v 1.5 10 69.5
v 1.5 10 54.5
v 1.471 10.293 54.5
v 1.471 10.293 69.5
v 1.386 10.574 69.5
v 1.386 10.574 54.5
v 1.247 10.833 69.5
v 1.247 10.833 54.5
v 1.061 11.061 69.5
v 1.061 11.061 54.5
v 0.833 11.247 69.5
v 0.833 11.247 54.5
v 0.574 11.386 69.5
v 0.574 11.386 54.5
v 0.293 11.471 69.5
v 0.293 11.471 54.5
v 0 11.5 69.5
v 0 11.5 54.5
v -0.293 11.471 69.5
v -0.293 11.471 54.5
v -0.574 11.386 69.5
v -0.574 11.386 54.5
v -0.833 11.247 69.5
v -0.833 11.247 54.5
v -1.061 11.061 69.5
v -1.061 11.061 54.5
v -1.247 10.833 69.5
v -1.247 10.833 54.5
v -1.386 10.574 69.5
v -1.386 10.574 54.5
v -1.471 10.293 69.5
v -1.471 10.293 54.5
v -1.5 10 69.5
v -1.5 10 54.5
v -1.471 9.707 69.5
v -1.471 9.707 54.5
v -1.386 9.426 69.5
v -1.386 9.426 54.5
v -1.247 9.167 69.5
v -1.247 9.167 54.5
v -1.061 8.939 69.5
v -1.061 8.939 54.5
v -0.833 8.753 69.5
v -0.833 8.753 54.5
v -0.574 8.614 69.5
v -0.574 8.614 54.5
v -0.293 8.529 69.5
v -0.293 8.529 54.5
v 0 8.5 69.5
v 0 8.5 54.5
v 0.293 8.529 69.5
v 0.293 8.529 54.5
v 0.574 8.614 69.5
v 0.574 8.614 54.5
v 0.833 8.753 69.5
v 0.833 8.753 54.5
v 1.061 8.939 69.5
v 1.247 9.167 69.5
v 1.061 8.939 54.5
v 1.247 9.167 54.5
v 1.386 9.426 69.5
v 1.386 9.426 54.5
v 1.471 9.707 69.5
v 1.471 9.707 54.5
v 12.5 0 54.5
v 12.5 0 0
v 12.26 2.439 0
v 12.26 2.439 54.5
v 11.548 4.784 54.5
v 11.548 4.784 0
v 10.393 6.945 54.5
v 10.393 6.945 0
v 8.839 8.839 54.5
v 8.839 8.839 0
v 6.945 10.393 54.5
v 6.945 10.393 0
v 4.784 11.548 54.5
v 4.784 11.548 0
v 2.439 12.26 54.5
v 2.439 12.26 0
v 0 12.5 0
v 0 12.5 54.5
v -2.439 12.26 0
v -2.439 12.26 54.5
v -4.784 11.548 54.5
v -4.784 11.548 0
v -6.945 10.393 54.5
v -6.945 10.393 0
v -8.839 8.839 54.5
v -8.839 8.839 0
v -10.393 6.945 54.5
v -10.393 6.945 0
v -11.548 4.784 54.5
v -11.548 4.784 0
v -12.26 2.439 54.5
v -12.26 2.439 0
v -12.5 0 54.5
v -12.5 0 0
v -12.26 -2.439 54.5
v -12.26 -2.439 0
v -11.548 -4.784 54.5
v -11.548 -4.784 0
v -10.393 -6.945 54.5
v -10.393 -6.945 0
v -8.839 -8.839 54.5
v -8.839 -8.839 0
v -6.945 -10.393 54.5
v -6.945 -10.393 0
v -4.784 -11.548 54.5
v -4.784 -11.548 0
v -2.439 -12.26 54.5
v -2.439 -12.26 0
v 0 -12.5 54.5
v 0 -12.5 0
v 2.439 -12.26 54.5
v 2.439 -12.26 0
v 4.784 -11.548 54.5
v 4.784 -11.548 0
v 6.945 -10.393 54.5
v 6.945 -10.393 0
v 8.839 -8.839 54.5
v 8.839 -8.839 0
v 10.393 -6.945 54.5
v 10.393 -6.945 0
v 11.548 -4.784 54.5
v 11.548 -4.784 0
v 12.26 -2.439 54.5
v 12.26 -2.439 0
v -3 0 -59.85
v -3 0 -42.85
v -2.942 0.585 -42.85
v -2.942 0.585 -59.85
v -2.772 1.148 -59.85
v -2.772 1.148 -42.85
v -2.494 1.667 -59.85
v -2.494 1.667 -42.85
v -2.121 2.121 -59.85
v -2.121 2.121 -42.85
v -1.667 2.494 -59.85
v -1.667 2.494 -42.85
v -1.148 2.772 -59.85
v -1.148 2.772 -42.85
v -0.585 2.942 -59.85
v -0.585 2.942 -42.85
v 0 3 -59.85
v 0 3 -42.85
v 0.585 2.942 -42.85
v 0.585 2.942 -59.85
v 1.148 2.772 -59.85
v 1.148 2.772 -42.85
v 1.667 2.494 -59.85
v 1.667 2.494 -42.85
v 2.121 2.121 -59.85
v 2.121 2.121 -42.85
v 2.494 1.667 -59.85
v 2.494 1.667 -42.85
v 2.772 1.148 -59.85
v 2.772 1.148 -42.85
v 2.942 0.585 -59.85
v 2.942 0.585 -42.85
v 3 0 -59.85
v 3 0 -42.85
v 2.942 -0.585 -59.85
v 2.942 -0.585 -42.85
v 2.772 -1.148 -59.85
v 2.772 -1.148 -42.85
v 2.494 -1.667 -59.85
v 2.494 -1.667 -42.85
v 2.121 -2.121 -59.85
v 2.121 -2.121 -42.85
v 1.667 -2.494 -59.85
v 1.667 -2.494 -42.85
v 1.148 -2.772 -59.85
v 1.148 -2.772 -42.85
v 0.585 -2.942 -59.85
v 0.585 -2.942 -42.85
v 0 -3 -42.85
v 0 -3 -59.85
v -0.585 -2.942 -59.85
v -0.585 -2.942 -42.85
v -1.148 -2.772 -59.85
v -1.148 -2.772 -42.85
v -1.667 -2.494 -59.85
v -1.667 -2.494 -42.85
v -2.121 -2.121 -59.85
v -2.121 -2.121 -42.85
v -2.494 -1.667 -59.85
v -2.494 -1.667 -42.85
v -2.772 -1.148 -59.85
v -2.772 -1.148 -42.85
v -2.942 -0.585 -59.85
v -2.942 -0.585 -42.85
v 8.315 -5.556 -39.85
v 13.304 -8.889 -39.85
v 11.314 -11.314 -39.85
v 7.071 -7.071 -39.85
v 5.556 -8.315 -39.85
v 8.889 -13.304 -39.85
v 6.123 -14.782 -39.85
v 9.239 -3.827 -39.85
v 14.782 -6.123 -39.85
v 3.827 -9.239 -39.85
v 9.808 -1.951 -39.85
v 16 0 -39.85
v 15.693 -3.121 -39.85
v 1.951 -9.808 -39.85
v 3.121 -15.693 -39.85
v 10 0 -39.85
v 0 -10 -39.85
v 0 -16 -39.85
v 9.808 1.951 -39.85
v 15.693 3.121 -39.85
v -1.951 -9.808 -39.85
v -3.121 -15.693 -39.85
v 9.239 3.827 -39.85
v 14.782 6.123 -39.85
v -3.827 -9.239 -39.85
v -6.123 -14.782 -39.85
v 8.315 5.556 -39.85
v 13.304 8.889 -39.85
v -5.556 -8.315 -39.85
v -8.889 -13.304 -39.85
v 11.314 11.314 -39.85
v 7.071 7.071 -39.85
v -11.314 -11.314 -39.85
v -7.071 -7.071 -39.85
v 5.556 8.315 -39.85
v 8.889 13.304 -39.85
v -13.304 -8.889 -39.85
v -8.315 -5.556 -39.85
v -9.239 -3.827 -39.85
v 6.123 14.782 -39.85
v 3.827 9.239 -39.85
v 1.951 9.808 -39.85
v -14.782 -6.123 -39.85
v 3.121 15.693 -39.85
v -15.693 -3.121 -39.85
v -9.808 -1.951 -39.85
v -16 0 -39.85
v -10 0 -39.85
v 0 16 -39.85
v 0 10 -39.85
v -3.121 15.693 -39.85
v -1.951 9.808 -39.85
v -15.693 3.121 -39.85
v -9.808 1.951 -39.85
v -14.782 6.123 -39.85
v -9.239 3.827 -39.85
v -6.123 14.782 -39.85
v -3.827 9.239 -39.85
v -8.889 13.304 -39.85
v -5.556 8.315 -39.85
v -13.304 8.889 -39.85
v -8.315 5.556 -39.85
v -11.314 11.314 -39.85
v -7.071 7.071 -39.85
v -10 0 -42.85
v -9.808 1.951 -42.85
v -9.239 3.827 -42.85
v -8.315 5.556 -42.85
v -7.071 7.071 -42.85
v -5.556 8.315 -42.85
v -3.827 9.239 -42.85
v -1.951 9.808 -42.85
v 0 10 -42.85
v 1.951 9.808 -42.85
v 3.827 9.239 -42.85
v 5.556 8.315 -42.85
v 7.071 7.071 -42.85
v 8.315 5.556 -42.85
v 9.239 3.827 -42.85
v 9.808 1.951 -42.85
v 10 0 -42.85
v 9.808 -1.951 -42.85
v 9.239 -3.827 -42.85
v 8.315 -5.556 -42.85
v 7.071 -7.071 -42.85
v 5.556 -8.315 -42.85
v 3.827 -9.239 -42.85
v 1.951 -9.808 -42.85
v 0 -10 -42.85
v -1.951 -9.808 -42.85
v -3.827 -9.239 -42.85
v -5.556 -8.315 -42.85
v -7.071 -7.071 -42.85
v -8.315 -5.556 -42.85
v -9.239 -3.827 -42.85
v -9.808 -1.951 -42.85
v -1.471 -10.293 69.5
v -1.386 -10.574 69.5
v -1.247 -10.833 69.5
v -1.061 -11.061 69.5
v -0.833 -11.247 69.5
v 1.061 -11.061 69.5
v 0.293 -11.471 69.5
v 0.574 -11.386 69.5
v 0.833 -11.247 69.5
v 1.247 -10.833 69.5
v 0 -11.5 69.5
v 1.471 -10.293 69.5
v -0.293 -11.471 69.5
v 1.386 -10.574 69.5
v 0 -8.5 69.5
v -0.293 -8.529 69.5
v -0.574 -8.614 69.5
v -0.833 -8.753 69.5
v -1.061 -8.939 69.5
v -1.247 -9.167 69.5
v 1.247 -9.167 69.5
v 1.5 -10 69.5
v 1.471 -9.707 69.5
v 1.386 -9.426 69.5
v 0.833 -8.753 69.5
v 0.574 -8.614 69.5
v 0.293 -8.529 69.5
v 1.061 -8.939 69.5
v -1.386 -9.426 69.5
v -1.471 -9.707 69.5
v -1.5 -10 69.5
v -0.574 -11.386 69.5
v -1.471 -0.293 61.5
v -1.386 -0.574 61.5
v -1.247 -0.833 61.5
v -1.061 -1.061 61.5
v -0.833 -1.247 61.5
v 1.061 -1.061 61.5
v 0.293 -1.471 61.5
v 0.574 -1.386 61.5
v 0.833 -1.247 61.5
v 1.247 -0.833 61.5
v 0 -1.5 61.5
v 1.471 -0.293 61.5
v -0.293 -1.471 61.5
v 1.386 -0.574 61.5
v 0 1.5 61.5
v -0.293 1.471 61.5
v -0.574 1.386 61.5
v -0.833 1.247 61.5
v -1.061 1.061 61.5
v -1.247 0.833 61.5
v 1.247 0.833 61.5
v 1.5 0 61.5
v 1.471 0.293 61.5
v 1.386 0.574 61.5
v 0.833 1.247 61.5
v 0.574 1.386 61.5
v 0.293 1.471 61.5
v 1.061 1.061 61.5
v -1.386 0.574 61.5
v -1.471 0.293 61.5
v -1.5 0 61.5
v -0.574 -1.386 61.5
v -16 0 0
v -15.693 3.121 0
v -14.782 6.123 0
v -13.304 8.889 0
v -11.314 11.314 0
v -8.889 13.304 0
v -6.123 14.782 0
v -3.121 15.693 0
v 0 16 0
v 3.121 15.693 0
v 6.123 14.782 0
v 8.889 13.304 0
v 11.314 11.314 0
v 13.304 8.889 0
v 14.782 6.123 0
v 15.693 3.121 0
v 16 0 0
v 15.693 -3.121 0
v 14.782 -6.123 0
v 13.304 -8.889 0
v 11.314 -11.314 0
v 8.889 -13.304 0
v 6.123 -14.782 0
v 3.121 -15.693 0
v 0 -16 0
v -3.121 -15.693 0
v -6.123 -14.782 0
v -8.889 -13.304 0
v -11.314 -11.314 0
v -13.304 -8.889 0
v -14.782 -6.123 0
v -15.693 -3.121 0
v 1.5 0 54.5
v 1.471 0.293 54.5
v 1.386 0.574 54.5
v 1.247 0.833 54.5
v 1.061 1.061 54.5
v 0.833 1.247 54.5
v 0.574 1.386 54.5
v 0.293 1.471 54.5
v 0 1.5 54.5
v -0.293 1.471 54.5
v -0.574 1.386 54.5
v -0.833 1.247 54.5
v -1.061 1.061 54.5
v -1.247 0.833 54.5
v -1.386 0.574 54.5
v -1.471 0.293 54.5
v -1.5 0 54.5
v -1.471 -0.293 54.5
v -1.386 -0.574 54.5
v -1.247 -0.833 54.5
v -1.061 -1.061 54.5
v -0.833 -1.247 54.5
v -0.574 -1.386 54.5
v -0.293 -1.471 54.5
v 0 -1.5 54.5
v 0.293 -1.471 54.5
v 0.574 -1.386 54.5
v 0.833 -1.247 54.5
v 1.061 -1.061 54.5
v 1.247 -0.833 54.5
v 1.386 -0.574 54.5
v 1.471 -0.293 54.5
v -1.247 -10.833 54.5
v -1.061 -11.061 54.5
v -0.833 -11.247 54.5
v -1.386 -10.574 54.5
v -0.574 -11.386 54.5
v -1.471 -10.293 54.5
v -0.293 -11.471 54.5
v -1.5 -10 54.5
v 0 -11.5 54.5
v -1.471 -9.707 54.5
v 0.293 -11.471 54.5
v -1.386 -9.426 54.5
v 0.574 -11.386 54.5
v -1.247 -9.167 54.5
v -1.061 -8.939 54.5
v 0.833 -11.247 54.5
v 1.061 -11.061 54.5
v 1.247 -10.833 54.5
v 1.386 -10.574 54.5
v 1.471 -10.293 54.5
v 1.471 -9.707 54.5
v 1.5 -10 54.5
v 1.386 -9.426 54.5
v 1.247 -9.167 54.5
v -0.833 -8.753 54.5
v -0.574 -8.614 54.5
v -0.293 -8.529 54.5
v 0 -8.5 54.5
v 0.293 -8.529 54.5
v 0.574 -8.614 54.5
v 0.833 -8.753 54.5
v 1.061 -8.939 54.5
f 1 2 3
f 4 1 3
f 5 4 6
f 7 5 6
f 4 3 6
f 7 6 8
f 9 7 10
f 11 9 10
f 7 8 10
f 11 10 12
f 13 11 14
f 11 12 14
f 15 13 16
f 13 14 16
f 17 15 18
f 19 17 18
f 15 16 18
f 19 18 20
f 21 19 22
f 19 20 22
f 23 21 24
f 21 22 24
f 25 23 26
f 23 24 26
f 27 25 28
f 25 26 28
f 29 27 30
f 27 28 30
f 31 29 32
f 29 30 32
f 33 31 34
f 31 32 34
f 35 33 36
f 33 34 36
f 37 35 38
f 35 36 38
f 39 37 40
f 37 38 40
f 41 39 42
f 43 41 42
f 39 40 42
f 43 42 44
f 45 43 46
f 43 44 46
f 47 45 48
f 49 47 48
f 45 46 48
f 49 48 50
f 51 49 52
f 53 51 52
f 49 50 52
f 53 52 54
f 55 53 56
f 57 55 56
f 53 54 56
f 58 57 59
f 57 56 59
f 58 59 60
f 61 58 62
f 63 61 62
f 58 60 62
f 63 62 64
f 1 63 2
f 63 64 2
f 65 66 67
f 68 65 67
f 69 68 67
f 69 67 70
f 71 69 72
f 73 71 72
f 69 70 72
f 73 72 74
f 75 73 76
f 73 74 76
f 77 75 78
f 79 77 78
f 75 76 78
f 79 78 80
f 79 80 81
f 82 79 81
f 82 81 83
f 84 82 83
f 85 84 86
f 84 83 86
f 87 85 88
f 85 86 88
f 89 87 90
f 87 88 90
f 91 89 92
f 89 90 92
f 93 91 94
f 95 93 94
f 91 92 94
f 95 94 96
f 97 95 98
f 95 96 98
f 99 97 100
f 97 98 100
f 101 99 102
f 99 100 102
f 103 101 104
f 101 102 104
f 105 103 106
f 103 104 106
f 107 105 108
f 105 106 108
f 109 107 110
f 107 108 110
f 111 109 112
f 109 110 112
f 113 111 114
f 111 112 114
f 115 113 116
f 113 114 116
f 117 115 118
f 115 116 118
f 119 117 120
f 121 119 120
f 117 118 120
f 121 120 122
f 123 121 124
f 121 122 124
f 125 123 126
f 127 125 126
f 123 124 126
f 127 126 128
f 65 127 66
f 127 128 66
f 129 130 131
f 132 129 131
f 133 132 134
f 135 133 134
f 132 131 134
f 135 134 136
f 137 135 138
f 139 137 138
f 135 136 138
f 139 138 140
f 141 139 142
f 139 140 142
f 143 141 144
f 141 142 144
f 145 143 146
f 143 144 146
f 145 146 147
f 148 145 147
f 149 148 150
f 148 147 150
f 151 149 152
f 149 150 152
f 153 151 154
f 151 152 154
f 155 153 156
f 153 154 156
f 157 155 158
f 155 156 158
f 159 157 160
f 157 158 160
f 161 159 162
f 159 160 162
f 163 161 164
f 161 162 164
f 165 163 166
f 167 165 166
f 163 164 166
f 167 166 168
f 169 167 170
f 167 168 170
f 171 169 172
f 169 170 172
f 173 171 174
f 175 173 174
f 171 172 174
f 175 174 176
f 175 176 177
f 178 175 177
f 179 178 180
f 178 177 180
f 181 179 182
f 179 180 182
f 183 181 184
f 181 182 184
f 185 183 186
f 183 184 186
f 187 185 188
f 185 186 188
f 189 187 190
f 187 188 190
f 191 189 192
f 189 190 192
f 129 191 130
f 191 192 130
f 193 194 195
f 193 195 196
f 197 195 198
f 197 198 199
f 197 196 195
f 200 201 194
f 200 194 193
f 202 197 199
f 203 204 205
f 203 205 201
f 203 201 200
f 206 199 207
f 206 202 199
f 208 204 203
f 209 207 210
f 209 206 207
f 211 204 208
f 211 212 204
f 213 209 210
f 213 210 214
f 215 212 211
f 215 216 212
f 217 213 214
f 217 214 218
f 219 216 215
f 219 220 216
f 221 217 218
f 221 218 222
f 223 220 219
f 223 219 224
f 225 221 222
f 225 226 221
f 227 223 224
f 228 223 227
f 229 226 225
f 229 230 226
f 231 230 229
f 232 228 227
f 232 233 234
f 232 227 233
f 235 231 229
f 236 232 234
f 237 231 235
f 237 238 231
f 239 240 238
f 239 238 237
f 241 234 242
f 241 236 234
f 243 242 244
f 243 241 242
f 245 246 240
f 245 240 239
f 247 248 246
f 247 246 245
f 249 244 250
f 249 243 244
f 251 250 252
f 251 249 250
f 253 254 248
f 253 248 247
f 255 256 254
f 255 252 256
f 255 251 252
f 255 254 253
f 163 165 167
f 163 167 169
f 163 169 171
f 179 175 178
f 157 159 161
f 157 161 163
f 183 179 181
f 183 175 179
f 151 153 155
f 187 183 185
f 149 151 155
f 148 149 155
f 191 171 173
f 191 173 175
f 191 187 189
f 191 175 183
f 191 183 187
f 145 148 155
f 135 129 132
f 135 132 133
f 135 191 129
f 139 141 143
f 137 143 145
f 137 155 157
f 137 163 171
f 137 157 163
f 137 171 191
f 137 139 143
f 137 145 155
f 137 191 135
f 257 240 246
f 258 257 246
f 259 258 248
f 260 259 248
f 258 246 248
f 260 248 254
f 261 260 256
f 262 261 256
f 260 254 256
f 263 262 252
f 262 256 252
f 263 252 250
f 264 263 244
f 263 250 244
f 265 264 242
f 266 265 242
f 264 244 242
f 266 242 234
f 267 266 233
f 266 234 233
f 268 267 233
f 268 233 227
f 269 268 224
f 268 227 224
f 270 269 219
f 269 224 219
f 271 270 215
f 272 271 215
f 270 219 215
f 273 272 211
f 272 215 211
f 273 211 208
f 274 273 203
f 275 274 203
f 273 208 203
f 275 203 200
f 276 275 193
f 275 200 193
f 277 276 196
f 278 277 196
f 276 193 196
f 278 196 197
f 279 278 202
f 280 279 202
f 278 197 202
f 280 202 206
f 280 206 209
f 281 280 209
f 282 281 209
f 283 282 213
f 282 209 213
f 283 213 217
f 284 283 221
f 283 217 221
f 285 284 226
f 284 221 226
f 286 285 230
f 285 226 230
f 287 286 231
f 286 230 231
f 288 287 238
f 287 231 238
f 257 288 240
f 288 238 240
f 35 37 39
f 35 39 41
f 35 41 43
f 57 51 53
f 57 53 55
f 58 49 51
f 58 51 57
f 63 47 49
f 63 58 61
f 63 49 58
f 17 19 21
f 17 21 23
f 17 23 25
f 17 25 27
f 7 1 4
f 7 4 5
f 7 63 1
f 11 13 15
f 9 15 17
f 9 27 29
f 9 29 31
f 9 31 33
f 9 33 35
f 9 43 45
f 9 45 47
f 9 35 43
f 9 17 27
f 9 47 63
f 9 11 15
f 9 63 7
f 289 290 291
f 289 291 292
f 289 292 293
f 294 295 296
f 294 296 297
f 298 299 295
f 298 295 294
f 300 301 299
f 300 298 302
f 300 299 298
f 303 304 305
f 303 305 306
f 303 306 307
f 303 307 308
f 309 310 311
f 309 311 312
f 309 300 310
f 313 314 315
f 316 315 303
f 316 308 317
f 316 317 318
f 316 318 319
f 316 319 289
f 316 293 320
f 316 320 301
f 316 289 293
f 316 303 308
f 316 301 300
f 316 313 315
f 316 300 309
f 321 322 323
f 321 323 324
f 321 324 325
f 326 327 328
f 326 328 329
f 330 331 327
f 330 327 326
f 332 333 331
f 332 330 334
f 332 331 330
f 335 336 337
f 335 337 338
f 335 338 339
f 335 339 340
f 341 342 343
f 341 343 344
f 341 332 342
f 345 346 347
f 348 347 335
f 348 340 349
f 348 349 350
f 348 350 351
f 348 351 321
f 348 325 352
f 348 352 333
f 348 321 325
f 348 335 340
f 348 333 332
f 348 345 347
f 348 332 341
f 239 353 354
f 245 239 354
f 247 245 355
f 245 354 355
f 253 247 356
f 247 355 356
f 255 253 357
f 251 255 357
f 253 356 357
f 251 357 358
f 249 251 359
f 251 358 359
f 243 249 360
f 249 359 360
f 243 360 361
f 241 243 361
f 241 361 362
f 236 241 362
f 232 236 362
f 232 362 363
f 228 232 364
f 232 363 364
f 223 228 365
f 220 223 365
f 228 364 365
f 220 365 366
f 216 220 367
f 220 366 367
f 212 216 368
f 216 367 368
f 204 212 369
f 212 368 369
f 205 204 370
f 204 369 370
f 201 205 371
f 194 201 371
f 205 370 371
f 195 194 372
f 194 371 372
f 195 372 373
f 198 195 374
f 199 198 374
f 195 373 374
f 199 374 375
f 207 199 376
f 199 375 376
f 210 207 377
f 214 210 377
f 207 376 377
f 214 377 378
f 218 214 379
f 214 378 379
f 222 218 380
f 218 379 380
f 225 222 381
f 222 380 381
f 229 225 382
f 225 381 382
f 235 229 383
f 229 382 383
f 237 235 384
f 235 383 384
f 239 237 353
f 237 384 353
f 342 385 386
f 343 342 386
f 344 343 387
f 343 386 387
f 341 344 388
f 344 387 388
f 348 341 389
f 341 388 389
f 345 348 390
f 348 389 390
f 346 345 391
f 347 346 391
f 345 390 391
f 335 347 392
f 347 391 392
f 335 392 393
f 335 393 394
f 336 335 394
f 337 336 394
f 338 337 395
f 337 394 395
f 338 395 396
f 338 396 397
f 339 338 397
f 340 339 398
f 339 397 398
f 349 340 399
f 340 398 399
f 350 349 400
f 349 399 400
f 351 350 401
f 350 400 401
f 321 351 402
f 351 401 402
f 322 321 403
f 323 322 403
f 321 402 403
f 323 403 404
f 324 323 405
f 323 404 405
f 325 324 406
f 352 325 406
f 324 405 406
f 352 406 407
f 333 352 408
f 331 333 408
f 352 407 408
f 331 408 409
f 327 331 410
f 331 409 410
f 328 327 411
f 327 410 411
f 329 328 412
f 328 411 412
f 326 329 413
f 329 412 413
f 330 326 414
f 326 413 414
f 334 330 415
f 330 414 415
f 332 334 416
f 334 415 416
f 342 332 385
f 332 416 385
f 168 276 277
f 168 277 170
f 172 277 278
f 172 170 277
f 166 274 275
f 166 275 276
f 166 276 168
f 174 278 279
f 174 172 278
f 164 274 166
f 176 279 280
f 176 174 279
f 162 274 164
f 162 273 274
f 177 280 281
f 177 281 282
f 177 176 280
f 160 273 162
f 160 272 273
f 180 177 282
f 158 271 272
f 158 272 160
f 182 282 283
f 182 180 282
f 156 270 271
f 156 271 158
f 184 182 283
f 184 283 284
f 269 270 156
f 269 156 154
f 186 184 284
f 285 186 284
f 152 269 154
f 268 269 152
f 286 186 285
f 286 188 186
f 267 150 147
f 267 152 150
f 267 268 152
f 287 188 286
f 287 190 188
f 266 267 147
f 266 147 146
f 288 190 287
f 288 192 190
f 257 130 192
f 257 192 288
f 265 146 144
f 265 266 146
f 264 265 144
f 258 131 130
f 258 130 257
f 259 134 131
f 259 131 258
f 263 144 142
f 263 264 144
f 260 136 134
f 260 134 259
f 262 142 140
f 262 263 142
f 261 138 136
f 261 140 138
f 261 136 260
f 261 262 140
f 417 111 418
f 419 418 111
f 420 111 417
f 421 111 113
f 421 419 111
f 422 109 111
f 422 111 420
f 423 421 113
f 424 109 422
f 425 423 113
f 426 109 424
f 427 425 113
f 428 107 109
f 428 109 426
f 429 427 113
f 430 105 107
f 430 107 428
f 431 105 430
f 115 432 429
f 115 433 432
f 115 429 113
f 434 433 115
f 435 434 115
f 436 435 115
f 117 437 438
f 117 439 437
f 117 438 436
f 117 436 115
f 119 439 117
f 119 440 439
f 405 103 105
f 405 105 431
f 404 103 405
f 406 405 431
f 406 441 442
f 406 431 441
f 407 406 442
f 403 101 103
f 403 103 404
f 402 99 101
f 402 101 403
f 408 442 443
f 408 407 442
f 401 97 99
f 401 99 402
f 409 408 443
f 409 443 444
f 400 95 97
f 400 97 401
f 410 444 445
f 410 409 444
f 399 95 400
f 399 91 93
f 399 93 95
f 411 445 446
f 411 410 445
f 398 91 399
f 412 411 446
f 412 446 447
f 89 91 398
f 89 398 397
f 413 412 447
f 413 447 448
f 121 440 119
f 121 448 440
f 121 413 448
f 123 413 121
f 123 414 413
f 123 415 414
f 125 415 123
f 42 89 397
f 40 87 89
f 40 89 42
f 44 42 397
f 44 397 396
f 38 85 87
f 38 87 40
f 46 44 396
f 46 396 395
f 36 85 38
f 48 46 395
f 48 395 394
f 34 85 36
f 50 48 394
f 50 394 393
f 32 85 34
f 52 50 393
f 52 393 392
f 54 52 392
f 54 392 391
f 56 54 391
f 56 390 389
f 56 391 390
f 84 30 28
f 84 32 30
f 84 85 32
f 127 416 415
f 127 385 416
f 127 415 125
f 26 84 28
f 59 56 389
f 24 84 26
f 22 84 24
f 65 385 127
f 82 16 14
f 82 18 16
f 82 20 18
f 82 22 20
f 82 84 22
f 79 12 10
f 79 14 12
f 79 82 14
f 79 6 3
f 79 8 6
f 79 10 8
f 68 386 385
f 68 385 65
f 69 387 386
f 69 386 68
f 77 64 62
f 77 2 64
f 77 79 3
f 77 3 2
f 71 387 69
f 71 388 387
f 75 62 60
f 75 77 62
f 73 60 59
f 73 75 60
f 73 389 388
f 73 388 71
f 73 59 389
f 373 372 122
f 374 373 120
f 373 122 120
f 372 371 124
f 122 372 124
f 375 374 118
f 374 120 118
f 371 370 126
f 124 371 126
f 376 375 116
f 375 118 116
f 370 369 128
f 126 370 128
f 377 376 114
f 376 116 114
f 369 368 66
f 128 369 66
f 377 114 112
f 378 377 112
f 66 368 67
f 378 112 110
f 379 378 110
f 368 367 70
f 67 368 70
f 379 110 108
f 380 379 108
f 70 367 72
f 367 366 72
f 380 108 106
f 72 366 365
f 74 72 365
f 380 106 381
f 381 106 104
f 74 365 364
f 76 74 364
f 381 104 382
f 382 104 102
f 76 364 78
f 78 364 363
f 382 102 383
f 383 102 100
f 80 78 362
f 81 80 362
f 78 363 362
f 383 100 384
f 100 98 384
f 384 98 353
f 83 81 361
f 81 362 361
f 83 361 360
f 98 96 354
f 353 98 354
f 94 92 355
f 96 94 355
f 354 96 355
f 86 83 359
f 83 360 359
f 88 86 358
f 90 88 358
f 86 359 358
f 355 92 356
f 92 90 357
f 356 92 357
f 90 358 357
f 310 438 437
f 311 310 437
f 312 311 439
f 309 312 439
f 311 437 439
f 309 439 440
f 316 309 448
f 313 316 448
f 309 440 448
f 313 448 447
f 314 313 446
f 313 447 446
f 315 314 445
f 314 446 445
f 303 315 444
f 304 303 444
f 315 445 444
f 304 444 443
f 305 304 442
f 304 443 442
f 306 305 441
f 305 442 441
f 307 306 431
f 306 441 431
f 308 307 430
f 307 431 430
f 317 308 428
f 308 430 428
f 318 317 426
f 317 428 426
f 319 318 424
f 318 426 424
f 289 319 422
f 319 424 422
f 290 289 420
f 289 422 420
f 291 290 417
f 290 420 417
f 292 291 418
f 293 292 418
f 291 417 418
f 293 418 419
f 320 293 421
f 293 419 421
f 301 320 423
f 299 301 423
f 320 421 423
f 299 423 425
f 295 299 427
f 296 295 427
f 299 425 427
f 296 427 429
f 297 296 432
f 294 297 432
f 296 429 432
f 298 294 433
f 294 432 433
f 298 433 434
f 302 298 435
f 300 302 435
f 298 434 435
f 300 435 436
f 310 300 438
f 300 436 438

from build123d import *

# Parameters (mm, degrees)
ESQUISSE1_R        = 12.5
BOSS_EXTRU_1_DEPTH = 54.5
ESQUISSE2_R        = 1.5
BOSS_EXTRU_2_DEPTH = 7
ESQUISSE3_R        = 16
BOSS_EXTRU_3_DEPTH = 39.85
ESQUISSE4_R        = 10
BOSS_EXTRU_4_DEPTH = 3
ESQUISSE5_R        = 3
BOSS_EXTRU_5_DEPTH = 17
ESQUISSE6_R        = 1.5
BOSS_EXTRU_6_DEPTH = 15


with BuildPart() as part:
    # Esquisse1 → Boss.-Extru.1 (new body)
    with BuildSketch(Plane.XY):
        Circle(ESQUISSE1_R)
    extrude(amount=BOSS_EXTRU_1_DEPTH)

    # Esquisse2 → Boss.-Extru.2 (add)
    with BuildSketch(Plane.XY.offset(54.5)):
        Circle(ESQUISSE2_R)
    extrude(amount=BOSS_EXTRU_2_DEPTH)

    # Esquisse3 → Boss.-Extru.3 (add)
    with BuildSketch(Plane(origin=(0, 0, 0), x_dir=(-1, 0, 0), z_dir=(0, 0, -1))):
        Circle(ESQUISSE3_R)
    extrude(amount=BOSS_EXTRU_3_DEPTH)

    # Esquisse4 → Boss.-Extru.4 (add)
    with BuildSketch(Plane(origin=(0, 0, -39.85), x_dir=(-1, 0, 0), z_dir=(0, 0, -1))):
        Circle(ESQUISSE4_R)
    extrude(amount=BOSS_EXTRU_4_DEPTH)

    # Esquisse5 → Boss.-Extru.5 (add)
    with BuildSketch(Plane(origin=(0, 0, -42.85), x_dir=(-1, 0, 0), z_dir=(0, 0, -1))):
        Circle(ESQUISSE5_R)
    extrude(amount=BOSS_EXTRU_5_DEPTH)

    # Esquisse6 → Boss.-Extru.6 (add)
    with BuildSketch(Plane.XY.offset(54.5)):
        with Locations((0, 10)):
            Circle(ESQUISSE6_R)
        with Locations((0, -10)):
            Circle(ESQUISSE6_R)
    extrude(amount=BOSS_EXTRU_6_DEPTH)


solid = part.part
